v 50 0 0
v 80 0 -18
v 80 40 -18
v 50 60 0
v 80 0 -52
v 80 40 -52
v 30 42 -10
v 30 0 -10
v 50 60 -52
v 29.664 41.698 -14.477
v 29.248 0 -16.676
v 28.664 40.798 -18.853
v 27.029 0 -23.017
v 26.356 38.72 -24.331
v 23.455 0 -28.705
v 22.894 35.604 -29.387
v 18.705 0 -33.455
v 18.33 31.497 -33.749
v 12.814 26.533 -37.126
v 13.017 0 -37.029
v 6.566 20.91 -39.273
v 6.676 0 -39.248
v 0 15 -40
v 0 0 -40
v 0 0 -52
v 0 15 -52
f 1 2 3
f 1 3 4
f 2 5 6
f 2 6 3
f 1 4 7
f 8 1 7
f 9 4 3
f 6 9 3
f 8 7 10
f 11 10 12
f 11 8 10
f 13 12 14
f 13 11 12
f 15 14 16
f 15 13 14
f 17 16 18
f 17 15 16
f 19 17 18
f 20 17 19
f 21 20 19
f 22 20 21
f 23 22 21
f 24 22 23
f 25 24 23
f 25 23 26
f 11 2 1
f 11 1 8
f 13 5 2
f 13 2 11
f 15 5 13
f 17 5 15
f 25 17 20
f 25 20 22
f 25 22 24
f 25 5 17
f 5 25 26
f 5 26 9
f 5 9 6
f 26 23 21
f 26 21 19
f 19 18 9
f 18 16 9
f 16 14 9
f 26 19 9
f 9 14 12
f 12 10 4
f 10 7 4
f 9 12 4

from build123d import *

# Parameters (mm, degrees)
EXTRUDE1_DEPTH     = 60
CUT_EXTRUDE1_DEPTH = 53


with BuildPart() as part:
    # Sketch1 → Extrude1 (new body)
    with BuildSketch(Plane(origin=(0, 0, 0), x_dir=(1, 0, 0), z_dir=(0, 1, 0))):
        with BuildLine():
            Line((0, 40), (0, 52))
            Line((0, 52), (80, 52))
            Line((80, 52), (80, 18))
            Line((80, 18), (50, 0))
            Line((50, 0), (30, 10))
            ThreePointArc((30, 10), (21.213203436, 31.213203436), (0, 40))
        make_face()
    extrude(amount=EXTRUDE1_DEPTH)

    # Sketch2 → Cut-Extrude1 (cut, through all)
    with BuildSketch(Plane.XY):
        Polygon((0, 60), (0, 15), (50, 60), align=None)
        Polygon((80, 40), (80, 60), (50, 60), align=None)
    extrude(amount=-CUT_EXTRUDE1_DEPTH, mode=Mode.SUBTRACT)


solid = part.part
